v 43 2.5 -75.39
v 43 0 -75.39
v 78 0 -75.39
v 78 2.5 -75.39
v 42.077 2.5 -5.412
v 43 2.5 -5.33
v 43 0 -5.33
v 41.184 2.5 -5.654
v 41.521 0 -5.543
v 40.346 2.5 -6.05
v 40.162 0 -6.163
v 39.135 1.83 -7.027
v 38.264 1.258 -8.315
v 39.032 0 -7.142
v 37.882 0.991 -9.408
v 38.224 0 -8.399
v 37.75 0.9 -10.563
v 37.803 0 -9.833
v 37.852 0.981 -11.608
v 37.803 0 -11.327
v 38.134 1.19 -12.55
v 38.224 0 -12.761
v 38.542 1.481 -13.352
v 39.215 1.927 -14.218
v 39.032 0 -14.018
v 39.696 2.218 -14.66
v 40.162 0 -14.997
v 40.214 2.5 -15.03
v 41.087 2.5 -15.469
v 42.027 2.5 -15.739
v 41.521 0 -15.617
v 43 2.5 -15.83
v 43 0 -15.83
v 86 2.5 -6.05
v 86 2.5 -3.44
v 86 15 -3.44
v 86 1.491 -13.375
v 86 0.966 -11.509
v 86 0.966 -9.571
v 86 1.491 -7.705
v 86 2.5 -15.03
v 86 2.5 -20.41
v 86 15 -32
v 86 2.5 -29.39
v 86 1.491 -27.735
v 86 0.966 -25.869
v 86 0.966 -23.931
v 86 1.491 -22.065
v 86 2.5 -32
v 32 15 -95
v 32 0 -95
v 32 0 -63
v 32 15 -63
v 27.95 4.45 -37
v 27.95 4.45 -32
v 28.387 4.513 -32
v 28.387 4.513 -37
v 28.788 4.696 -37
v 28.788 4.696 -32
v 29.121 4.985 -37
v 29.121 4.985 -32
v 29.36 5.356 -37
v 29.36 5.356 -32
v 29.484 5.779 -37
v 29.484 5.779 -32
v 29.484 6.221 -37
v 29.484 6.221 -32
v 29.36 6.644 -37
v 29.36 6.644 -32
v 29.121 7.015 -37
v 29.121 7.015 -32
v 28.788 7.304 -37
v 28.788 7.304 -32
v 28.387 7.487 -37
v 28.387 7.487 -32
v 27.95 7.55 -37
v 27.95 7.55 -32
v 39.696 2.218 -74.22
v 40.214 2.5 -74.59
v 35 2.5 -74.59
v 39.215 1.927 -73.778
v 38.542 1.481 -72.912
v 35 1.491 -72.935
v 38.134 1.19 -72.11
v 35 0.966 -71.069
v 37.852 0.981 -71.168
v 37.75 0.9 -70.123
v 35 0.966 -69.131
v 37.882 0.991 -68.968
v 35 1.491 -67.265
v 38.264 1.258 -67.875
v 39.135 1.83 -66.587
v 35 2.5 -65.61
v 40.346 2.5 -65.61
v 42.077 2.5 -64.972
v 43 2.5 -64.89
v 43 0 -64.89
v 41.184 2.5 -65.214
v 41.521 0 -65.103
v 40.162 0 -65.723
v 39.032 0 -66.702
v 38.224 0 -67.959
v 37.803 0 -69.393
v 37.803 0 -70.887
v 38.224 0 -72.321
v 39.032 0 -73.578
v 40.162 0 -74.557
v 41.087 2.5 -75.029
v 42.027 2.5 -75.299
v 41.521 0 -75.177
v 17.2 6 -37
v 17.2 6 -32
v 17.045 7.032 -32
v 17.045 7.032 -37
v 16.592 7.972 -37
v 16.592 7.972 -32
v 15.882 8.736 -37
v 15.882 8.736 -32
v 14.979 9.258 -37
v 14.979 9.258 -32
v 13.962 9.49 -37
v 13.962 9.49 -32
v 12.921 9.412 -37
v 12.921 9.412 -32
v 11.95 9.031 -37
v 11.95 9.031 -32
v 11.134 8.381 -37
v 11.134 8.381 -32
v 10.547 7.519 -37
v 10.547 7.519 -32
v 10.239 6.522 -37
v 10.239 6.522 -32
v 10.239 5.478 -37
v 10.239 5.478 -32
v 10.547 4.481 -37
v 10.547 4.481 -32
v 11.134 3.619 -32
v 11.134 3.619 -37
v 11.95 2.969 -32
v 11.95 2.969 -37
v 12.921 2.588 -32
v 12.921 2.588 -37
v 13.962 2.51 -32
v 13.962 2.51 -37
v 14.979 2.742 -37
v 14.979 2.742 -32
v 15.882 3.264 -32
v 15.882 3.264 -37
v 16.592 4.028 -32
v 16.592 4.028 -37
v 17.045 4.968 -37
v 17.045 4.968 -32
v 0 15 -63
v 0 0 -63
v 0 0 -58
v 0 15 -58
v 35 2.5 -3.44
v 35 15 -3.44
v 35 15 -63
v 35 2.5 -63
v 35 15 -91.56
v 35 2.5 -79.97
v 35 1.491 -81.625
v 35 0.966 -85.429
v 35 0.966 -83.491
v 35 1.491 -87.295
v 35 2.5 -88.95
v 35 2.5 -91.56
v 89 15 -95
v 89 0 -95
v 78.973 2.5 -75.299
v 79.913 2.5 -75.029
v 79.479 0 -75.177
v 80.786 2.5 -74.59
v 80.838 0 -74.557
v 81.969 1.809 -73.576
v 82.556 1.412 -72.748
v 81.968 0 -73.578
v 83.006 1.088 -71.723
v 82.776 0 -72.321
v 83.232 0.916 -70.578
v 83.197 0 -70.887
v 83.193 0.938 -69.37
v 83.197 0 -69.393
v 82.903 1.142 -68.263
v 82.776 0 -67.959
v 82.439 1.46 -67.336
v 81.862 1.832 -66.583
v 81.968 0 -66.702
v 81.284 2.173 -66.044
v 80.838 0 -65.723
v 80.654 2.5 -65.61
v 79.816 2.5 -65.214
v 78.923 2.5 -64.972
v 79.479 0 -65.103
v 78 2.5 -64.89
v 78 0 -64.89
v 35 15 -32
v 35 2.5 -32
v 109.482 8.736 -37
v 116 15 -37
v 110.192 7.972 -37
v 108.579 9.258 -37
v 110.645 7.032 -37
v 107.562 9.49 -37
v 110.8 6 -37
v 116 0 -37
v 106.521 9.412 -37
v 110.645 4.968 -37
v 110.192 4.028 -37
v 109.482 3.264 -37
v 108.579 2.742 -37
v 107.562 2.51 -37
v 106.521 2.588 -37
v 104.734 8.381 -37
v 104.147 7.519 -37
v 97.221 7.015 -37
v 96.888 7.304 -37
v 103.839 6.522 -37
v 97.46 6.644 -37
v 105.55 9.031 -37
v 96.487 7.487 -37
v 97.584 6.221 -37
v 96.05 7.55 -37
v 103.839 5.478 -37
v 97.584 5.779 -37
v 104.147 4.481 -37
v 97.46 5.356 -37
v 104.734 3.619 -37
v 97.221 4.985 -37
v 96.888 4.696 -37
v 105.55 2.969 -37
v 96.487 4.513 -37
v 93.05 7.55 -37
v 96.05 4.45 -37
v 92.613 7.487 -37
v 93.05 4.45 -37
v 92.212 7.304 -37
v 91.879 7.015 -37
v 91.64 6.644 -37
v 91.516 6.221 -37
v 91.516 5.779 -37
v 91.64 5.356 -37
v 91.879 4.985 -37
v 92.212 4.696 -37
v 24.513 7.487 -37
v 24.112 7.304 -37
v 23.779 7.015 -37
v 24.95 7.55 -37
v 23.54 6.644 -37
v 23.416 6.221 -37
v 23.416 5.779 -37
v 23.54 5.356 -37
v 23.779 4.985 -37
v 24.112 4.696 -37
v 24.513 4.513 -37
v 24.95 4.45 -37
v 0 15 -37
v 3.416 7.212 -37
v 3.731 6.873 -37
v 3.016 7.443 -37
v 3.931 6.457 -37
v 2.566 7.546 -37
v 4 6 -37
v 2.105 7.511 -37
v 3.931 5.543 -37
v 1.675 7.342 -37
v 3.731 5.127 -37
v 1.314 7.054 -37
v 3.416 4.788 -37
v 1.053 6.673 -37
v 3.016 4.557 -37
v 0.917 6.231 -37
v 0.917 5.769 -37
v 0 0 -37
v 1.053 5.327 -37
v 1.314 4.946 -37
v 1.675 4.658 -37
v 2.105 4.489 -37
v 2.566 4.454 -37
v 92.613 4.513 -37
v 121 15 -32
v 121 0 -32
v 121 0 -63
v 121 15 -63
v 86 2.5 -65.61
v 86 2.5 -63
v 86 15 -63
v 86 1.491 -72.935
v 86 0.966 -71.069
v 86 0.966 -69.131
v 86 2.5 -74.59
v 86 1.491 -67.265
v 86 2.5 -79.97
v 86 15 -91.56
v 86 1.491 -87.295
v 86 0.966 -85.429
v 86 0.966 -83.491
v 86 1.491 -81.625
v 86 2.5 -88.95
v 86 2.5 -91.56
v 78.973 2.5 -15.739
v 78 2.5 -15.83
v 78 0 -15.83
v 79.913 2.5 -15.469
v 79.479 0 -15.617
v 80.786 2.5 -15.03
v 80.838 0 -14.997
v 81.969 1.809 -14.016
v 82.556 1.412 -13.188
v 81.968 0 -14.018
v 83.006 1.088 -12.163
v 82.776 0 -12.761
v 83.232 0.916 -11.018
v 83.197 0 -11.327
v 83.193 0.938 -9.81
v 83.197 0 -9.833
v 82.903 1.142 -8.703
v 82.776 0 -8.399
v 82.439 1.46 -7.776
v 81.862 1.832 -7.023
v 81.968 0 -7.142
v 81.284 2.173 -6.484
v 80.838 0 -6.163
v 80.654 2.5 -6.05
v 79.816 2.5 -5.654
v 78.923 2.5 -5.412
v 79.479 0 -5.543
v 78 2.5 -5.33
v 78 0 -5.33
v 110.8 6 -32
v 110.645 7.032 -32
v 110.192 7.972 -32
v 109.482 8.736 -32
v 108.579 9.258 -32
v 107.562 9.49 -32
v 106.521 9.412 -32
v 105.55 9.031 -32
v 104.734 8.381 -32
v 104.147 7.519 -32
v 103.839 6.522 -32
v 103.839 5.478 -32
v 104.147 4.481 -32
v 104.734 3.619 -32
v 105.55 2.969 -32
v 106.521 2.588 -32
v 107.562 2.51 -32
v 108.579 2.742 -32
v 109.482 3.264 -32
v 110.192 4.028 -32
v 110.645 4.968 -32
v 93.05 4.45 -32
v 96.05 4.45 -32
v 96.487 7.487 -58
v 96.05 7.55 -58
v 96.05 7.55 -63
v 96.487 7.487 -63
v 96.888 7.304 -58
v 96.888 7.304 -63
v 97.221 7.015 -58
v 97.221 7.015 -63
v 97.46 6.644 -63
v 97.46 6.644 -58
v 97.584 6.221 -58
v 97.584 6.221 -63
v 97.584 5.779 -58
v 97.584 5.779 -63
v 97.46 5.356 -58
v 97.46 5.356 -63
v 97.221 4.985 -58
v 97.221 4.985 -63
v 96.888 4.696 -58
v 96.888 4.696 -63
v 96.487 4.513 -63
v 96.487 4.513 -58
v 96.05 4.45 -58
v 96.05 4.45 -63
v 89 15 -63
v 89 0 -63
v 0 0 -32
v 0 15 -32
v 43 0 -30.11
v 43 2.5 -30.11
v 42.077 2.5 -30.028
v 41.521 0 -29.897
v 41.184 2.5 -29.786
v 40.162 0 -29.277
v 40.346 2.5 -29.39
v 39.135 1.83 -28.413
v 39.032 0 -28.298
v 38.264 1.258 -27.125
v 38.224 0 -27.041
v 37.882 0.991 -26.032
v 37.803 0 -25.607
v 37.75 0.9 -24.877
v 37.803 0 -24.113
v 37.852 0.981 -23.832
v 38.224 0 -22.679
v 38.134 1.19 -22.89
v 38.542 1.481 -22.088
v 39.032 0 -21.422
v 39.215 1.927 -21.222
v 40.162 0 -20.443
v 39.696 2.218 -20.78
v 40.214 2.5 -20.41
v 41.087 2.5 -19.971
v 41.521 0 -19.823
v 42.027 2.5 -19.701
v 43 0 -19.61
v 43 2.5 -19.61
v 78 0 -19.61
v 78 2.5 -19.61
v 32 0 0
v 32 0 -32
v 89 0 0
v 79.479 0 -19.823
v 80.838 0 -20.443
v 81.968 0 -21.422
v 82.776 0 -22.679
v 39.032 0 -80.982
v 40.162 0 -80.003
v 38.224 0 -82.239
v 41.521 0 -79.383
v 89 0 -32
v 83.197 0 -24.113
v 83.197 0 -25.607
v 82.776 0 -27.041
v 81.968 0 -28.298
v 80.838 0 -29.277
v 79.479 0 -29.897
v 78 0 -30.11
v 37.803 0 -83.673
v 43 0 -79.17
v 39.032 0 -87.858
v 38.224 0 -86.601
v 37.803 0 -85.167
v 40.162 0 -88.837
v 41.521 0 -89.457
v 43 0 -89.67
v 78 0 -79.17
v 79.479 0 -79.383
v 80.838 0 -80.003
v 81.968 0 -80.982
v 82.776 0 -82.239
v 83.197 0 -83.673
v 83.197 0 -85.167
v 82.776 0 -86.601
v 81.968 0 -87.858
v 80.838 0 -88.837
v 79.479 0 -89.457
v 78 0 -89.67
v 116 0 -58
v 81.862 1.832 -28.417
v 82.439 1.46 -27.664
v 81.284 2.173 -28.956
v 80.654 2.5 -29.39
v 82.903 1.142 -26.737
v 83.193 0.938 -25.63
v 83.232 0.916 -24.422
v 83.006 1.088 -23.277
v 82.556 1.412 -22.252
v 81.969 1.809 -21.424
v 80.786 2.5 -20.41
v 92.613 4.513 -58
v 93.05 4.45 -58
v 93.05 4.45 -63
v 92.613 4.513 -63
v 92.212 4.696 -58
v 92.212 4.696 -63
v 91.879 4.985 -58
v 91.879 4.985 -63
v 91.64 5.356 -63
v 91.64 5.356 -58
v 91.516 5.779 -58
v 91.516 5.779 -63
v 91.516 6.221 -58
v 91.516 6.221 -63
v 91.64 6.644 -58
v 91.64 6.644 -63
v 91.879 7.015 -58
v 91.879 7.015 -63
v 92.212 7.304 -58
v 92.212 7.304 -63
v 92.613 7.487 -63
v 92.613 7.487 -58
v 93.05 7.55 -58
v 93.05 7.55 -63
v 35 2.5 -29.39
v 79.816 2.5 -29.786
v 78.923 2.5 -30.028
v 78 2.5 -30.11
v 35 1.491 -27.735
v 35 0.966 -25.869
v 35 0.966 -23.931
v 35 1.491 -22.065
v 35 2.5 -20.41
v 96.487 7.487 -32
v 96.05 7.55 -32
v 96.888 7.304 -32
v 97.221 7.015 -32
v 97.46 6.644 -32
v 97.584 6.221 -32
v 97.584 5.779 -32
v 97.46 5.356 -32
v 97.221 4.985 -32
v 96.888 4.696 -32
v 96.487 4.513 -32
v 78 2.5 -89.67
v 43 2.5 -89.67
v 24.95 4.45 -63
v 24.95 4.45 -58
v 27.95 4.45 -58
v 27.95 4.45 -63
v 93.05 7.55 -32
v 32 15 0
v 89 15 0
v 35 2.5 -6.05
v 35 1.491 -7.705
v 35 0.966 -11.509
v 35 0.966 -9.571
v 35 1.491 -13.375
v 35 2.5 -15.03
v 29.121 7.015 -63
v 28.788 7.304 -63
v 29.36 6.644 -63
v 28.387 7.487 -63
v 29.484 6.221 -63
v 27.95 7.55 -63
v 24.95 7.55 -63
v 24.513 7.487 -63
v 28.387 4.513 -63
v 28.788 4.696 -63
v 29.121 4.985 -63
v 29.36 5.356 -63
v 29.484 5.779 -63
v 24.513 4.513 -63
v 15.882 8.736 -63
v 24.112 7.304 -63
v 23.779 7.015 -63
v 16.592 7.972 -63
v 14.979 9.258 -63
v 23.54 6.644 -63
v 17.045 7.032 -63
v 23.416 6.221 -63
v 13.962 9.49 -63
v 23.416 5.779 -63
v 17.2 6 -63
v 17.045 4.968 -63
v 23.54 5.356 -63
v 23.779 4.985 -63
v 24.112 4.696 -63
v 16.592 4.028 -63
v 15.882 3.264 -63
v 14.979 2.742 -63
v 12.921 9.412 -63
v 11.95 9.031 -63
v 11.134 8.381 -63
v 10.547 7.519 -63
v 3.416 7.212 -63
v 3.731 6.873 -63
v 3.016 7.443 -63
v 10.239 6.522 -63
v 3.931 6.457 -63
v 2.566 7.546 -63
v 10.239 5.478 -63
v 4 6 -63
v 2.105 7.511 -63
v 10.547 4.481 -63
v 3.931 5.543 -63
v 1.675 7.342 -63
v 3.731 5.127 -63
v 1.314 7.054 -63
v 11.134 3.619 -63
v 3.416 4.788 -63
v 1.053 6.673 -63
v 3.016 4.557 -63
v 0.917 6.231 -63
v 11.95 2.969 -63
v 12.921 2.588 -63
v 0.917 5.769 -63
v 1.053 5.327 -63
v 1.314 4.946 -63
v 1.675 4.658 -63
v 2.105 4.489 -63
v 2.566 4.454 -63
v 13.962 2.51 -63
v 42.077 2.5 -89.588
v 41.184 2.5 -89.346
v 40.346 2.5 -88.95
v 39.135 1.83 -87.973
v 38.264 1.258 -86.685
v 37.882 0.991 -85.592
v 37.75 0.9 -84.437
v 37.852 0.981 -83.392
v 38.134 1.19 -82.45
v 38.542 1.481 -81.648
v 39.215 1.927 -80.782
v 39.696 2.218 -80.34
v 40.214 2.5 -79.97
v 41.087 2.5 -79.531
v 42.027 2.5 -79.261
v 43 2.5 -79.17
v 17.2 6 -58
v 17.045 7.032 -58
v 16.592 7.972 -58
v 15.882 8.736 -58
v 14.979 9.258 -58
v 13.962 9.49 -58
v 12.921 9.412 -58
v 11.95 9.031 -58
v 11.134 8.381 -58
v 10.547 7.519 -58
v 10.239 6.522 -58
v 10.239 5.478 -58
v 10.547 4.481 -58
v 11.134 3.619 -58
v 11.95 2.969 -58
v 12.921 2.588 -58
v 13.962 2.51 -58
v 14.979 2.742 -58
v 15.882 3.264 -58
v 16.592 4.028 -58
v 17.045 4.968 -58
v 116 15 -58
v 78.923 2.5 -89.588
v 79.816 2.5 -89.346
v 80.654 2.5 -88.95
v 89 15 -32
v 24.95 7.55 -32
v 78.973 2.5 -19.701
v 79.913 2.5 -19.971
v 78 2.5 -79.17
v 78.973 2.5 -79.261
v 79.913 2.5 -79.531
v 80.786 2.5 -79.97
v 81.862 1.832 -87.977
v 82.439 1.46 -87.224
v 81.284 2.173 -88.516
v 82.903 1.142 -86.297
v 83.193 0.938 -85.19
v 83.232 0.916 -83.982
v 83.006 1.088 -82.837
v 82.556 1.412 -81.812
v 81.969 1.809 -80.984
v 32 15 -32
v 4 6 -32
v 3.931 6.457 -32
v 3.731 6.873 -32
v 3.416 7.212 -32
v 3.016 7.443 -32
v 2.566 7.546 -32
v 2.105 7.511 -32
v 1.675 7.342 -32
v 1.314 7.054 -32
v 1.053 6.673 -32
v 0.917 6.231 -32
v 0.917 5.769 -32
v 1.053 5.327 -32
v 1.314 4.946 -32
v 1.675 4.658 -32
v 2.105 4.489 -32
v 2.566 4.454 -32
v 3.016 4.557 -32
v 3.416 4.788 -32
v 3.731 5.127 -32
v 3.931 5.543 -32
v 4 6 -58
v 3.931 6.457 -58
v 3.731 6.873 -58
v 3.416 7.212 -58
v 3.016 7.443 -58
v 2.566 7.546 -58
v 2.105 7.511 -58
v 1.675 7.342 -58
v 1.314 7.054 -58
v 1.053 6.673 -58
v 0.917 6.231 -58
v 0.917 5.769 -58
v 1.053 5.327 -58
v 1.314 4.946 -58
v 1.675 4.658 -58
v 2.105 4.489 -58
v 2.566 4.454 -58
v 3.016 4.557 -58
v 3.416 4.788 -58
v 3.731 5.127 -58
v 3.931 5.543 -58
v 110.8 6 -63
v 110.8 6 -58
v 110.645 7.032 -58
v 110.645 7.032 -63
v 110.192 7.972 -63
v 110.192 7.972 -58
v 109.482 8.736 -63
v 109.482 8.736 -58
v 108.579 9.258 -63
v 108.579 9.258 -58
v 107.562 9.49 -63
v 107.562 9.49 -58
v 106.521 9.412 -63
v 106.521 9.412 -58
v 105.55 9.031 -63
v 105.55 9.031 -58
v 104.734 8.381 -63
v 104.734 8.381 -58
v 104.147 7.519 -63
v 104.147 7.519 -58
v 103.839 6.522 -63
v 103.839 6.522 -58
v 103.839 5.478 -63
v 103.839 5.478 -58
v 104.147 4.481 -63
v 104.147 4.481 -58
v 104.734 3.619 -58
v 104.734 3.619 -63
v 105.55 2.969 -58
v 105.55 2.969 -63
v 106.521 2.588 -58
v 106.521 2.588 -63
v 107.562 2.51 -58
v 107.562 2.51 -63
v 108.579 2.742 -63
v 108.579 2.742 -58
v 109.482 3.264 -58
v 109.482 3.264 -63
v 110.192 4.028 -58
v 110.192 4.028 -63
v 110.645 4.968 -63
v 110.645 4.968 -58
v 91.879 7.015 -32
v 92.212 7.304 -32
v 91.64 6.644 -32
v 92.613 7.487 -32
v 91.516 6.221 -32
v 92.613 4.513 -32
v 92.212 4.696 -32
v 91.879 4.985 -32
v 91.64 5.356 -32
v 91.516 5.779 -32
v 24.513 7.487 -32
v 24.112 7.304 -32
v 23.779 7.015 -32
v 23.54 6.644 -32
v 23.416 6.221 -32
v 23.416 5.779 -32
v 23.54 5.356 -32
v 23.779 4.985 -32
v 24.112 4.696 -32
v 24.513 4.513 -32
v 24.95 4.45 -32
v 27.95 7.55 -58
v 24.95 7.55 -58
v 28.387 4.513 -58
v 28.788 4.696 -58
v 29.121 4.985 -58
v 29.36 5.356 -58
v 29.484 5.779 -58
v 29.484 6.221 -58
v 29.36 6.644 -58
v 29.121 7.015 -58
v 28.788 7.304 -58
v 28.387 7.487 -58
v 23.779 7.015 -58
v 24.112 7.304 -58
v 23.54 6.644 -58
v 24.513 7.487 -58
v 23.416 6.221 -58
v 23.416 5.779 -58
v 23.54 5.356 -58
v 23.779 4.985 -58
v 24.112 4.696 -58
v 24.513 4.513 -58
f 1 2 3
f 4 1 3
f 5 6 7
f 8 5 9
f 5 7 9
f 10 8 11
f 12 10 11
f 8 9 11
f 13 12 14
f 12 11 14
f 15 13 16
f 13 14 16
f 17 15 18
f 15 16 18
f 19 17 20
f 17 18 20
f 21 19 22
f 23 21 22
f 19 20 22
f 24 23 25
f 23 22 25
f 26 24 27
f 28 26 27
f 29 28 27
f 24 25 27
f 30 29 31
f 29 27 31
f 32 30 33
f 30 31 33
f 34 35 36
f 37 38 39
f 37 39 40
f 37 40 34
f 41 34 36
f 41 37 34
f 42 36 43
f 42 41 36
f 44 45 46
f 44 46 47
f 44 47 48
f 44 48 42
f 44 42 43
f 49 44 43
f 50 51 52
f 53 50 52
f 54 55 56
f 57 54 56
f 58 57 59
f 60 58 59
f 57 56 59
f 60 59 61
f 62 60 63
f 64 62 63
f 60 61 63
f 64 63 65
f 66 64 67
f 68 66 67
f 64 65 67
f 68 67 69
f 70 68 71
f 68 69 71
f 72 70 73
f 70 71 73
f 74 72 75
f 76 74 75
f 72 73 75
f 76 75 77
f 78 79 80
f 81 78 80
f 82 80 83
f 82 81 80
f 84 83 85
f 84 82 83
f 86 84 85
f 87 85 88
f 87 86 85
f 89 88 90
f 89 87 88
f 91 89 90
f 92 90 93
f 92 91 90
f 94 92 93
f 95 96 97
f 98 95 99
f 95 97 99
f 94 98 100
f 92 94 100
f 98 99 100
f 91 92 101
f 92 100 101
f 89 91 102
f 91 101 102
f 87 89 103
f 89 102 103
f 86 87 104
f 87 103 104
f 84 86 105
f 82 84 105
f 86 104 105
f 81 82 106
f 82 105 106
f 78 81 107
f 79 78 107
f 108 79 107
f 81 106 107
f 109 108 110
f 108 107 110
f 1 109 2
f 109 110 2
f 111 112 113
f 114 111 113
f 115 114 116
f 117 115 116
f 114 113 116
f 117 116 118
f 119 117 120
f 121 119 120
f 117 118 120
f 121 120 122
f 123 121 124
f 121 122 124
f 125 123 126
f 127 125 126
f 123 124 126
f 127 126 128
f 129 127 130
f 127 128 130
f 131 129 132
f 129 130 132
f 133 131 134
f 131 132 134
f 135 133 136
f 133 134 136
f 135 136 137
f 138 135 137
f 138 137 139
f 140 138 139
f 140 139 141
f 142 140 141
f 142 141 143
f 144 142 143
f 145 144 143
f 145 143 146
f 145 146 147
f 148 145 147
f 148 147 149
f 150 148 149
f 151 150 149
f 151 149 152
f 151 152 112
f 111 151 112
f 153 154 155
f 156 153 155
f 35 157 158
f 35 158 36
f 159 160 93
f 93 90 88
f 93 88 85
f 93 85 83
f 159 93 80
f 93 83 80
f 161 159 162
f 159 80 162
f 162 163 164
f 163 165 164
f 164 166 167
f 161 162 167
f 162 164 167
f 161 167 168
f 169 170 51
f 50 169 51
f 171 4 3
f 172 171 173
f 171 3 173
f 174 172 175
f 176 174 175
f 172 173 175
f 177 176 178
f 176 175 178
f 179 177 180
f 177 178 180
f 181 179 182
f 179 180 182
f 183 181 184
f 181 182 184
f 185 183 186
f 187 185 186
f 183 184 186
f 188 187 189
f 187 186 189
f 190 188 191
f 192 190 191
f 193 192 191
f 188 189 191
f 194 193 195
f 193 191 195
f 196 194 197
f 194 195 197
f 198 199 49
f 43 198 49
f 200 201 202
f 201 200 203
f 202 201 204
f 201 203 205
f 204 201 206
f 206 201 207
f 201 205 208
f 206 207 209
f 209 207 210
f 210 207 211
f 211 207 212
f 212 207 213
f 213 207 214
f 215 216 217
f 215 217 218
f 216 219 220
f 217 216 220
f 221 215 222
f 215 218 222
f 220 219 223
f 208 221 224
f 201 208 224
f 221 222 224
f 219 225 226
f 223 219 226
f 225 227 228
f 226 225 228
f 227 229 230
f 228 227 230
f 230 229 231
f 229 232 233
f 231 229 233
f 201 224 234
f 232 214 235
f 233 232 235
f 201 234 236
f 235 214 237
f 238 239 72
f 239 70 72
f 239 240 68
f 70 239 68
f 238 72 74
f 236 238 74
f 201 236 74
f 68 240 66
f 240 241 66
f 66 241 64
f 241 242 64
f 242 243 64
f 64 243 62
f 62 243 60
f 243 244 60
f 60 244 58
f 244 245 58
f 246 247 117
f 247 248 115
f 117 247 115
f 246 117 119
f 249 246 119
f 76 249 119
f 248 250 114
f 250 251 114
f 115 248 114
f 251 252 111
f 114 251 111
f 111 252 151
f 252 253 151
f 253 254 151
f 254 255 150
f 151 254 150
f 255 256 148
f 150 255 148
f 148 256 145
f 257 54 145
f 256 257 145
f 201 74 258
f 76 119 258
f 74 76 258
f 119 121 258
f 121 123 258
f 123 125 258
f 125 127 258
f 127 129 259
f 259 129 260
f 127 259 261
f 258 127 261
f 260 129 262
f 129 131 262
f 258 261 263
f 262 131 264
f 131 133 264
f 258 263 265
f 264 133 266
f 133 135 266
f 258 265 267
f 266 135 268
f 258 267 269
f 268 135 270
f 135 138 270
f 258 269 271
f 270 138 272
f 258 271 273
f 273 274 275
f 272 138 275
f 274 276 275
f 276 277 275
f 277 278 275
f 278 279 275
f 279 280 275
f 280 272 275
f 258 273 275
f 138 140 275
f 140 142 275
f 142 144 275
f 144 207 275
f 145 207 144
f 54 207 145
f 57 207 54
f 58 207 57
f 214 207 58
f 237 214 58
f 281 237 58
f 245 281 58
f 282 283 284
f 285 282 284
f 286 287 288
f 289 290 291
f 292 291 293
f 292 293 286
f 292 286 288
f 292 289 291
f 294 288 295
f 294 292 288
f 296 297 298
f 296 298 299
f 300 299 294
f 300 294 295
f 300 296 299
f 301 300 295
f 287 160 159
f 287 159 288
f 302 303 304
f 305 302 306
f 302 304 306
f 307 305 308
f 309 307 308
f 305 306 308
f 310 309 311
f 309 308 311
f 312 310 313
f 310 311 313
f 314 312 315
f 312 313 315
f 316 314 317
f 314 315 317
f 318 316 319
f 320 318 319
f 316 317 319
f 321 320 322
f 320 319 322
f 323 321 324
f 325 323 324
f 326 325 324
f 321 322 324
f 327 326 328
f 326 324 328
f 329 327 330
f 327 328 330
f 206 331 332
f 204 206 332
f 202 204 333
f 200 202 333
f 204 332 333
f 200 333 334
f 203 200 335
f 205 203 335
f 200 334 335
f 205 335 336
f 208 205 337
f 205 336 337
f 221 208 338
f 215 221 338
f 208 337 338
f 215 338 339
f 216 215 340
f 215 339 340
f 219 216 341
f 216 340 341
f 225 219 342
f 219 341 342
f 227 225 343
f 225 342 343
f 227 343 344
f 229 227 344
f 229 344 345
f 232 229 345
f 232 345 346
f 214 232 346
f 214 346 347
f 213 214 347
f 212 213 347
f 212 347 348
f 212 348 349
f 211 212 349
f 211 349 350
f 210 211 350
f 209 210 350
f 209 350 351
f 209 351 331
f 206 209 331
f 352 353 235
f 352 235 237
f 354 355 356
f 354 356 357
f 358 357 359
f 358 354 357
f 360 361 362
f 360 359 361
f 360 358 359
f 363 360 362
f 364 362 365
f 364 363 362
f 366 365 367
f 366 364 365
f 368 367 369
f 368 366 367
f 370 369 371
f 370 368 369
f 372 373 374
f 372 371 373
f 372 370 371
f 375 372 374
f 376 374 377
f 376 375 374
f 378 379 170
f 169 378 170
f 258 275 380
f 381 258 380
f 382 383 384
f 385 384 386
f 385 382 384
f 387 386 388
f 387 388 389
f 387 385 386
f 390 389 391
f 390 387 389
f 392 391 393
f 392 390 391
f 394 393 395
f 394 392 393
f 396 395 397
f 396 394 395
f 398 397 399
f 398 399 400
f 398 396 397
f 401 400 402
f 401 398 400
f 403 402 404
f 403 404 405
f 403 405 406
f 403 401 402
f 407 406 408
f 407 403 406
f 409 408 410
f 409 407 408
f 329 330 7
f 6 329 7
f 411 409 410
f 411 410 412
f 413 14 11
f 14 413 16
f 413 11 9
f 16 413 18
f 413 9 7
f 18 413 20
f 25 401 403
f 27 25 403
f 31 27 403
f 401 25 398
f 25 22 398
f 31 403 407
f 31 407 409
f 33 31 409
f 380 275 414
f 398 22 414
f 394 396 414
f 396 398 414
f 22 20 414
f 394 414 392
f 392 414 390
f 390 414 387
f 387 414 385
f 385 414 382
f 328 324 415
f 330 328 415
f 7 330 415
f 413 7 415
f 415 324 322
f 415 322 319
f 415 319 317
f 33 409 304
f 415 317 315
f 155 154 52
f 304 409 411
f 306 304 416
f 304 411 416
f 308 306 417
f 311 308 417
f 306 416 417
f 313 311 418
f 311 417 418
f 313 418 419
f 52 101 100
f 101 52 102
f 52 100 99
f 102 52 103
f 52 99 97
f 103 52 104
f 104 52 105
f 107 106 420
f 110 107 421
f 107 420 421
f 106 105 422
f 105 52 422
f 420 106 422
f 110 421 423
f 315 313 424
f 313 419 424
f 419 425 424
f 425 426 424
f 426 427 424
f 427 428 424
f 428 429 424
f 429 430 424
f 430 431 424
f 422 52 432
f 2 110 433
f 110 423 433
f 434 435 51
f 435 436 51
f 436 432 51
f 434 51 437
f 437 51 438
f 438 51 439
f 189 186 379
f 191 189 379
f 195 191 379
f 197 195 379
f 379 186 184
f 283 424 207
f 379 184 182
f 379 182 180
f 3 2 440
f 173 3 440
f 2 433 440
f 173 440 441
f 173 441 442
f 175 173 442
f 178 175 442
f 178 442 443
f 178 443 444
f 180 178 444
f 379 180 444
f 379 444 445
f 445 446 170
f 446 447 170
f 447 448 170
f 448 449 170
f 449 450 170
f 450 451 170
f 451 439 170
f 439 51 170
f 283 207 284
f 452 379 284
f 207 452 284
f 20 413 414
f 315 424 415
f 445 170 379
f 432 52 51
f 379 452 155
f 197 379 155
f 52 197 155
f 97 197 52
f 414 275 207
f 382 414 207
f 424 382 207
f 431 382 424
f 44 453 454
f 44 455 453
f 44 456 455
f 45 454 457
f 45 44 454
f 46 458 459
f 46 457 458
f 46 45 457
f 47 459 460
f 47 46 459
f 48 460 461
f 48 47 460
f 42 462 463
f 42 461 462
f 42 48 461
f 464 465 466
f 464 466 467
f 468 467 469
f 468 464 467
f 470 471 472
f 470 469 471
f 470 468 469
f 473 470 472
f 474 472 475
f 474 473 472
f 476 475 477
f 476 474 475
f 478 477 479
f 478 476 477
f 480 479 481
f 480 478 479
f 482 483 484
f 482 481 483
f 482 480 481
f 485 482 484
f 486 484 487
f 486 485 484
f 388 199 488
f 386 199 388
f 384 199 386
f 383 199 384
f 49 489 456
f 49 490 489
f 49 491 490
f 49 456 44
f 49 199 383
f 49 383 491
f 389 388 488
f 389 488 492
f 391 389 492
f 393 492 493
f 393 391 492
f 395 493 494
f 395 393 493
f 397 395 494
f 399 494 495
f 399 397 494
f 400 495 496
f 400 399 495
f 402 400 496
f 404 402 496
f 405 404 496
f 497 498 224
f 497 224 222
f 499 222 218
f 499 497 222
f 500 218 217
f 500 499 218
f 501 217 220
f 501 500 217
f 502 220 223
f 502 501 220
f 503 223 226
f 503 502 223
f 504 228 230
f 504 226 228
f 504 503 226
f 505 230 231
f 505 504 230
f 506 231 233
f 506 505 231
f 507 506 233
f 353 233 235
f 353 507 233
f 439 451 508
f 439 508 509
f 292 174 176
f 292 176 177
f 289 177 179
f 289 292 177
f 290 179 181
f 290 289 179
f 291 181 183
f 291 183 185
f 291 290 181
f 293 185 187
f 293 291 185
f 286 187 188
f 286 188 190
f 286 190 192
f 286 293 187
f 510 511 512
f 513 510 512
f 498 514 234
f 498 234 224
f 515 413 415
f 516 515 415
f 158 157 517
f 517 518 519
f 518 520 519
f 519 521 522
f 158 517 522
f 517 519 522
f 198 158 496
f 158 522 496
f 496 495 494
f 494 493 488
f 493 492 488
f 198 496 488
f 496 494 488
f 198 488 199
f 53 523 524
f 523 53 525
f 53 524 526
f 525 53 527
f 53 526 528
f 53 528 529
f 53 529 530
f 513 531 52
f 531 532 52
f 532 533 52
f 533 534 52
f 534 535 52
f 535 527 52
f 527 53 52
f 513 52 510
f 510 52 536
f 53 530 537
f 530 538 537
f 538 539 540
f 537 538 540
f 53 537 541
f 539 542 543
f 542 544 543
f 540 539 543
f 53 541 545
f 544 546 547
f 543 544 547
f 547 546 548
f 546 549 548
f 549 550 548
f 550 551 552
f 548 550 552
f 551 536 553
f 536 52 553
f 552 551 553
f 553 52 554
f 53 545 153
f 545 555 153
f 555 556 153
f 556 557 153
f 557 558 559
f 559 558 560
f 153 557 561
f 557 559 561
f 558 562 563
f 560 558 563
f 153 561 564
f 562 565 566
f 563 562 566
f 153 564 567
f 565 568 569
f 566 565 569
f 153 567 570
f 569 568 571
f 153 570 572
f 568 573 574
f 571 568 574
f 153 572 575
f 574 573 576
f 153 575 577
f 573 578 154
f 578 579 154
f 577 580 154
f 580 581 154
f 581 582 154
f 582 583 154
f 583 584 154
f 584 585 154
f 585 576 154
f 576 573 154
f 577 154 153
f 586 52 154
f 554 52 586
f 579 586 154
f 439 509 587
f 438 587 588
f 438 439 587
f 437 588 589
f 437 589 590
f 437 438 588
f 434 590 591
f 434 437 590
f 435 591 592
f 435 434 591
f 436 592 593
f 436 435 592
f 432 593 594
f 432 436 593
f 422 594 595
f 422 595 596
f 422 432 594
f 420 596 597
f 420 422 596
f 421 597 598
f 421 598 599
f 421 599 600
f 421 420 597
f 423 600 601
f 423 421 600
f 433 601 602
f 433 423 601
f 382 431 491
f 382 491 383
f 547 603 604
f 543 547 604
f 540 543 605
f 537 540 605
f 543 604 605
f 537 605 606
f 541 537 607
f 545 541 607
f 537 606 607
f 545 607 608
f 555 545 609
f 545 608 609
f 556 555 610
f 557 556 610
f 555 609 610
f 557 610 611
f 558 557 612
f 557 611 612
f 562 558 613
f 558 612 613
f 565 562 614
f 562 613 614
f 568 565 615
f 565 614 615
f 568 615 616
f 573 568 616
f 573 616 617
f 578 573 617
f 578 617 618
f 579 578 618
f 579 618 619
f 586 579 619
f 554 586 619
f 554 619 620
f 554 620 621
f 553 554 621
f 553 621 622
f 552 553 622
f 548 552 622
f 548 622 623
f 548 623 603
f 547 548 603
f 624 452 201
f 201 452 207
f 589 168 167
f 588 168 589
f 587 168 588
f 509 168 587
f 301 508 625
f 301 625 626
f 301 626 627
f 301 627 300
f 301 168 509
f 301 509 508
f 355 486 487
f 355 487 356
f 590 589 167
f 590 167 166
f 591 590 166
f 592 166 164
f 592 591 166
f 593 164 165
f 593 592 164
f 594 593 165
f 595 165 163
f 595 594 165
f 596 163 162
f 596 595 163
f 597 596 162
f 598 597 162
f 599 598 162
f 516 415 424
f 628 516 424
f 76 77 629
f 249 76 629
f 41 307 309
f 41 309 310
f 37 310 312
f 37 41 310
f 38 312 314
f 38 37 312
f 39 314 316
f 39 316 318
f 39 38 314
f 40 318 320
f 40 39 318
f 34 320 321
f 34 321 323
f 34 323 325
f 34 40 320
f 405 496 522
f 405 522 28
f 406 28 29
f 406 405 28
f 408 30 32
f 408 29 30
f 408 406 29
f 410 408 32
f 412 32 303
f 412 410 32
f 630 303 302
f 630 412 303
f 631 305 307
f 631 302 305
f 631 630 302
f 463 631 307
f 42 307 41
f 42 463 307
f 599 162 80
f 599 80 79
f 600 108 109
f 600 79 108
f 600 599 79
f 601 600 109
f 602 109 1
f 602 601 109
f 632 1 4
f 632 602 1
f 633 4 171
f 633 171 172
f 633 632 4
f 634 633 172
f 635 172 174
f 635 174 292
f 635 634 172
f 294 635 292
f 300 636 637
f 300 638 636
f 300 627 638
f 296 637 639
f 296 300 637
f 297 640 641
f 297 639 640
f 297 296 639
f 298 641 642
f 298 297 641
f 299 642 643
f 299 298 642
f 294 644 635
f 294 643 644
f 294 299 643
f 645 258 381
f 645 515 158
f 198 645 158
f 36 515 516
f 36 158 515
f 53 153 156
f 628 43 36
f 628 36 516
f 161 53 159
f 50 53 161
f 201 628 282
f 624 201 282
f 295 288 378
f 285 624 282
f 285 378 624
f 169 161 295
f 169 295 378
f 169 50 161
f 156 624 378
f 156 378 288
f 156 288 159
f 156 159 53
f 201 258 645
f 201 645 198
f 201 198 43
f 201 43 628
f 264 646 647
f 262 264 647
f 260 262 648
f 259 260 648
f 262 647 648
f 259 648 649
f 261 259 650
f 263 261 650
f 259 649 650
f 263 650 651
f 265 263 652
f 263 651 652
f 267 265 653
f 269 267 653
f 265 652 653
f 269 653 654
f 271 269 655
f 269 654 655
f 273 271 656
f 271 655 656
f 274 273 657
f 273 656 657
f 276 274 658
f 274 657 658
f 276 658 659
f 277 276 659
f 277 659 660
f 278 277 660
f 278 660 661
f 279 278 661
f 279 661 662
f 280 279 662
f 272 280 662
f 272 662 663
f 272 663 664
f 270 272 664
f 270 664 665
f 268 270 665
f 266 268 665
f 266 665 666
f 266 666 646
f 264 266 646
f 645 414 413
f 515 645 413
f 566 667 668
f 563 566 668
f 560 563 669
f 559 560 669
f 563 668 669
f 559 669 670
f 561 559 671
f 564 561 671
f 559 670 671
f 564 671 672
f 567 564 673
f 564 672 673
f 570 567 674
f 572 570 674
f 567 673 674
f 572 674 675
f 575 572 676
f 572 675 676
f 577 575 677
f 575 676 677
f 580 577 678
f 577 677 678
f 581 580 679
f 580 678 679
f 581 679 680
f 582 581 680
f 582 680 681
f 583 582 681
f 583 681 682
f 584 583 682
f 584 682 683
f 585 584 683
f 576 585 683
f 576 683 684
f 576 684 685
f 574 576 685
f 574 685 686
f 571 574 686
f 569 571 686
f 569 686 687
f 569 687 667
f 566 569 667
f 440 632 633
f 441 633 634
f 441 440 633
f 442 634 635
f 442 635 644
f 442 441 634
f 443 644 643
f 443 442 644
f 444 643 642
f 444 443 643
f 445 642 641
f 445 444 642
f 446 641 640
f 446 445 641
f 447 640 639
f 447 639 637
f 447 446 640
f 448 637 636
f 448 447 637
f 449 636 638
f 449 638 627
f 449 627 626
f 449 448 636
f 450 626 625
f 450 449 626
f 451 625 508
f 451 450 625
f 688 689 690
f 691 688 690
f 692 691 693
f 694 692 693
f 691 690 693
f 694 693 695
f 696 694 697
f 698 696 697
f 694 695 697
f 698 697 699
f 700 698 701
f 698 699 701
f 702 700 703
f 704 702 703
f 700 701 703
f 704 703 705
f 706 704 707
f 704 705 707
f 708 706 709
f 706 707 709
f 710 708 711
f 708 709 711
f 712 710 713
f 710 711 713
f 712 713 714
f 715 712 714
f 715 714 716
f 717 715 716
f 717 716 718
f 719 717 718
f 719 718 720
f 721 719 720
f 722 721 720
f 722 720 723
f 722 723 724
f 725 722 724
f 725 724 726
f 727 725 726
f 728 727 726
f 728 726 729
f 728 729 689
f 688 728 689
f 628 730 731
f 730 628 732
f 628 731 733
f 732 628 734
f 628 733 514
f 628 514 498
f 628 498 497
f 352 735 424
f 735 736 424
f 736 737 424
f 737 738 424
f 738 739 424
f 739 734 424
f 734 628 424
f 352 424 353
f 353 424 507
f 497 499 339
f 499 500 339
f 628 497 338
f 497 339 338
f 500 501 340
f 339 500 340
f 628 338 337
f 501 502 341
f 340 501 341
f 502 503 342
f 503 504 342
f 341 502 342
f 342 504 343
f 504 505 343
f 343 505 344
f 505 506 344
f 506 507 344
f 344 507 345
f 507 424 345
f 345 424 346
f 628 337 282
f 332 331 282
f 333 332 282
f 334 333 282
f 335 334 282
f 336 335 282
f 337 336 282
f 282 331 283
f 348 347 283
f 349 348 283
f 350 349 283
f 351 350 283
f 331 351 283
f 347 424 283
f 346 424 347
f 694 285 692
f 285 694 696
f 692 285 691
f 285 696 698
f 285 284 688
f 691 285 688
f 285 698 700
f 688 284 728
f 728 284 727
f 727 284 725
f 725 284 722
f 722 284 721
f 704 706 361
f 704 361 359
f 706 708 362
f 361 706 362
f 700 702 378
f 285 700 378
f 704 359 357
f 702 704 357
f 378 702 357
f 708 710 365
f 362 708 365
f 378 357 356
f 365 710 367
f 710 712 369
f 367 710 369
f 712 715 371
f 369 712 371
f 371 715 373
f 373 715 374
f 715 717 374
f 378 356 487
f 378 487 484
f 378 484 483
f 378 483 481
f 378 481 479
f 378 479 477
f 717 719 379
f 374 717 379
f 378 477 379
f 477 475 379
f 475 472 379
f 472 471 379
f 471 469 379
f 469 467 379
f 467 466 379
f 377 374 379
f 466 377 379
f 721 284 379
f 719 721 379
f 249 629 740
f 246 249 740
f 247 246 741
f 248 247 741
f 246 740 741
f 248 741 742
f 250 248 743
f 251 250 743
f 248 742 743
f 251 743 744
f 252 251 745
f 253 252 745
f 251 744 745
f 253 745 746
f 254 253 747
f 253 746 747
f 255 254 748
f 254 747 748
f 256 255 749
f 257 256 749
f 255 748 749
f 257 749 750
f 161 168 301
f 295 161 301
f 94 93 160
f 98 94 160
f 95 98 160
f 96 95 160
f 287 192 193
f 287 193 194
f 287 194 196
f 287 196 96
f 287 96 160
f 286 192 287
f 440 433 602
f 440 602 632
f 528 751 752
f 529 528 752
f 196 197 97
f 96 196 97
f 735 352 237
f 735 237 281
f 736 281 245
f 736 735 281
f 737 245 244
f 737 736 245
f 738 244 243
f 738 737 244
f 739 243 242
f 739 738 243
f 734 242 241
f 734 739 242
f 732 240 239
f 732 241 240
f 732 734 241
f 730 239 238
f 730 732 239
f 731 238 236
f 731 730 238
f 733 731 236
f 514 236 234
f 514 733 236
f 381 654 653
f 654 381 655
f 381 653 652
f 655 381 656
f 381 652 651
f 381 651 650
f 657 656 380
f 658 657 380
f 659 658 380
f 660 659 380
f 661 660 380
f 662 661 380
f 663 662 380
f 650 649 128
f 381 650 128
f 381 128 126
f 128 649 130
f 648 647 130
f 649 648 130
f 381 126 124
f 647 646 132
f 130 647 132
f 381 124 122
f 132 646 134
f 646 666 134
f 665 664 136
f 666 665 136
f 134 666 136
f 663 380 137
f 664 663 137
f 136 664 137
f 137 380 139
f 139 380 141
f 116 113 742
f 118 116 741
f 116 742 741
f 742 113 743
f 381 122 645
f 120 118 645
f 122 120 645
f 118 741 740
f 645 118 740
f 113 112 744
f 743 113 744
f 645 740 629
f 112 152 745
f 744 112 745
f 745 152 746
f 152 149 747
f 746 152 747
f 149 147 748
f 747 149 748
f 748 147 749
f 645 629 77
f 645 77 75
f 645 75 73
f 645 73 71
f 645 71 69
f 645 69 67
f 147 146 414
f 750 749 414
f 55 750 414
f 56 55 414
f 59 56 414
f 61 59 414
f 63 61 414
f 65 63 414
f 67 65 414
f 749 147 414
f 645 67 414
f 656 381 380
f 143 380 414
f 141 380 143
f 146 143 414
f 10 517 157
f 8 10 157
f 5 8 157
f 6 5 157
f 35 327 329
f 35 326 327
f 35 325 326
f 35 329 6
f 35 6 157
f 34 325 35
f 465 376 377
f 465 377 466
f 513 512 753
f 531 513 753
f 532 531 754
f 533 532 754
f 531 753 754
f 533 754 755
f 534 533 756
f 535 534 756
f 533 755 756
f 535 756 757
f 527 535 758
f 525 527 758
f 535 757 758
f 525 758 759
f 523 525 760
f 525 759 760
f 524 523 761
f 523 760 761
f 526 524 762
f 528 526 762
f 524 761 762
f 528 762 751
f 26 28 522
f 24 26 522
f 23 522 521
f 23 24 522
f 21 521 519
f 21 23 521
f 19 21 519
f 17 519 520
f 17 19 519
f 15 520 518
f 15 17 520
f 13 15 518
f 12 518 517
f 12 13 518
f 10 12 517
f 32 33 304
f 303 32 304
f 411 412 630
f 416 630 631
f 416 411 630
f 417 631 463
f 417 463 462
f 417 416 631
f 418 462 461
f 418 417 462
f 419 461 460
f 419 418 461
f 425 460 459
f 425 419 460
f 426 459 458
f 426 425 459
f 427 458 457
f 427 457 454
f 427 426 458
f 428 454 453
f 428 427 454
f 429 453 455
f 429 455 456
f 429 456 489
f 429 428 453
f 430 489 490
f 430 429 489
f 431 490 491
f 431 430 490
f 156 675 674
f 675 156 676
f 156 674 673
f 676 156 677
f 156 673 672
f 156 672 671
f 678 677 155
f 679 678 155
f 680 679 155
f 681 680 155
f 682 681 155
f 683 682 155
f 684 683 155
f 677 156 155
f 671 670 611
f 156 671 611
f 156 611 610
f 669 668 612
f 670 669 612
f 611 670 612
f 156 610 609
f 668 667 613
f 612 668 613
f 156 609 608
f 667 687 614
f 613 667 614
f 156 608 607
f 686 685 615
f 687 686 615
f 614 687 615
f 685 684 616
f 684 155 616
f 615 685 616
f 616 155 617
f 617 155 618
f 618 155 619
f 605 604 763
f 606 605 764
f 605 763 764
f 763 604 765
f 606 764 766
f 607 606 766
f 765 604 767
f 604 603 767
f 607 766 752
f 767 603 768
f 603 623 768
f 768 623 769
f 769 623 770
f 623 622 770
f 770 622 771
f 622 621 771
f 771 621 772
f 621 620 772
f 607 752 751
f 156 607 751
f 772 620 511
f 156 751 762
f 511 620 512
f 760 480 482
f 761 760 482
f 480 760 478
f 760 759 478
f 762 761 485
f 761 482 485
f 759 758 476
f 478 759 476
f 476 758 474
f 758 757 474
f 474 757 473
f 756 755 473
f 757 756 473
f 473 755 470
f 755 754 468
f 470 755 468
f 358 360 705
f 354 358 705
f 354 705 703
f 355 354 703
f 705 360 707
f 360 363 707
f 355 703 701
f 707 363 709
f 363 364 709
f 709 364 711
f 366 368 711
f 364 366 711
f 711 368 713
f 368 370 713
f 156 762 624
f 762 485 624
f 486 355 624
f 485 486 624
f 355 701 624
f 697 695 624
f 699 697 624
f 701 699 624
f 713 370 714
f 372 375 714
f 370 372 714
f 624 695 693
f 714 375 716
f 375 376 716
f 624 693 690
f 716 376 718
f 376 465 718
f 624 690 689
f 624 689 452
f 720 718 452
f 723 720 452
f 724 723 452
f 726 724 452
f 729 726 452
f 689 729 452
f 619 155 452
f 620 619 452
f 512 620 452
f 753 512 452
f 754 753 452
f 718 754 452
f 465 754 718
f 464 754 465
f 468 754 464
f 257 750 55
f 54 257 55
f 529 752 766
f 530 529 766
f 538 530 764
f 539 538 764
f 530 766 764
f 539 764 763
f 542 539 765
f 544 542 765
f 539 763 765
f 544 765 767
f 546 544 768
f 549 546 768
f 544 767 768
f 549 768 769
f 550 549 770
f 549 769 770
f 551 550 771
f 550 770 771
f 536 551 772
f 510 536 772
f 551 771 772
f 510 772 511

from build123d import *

# Parameters (mm, degrees)
SKETCH1_W                  = 51
SKETCH1_H                  = 28.56
TOTALHEIGHT_DEPTH          = 15
SKETCH1_3_W                = 51
SKETCH1_3_H                = 28.56
FLOORHEIGHT_DEPTH          = 2.5
HOLESFORBEARINGMOUNT_REACH = 139.241
SKETCH2_R                  = 1.55
SKETCH2_R_2                = 3.5
CUT_EXTRUDE2_REACH         = 131.019


with BuildPart() as part:
    # Sketch1 → TotalHeight (new body)
    with BuildSketch(Plane(origin=(0, 0, 0), x_dir=(1, 0, 0), z_dir=(0, 1, 0))):
        Polygon((32, 32), (32, 0), (89, 0), (89, 32), (121, 32), (121, 47.5), (121, 63), (89, 63), (89, 95), (32, 95), (32, 63), (0, 63), (0, 58), (5, 58), (116, 58), (116, 37), (5, 37), (0, 37), (0, 32), align=None)
        with Locations((60.5, 17.72)):
            Rectangle(SKETCH1_W, SKETCH1_H, mode=Mode.SUBTRACT)
        with Locations((60.5, 77.28)):
            Rectangle(SKETCH1_W, SKETCH1_H, mode=Mode.SUBTRACT)
    extrude(amount=TOTALHEIGHT_DEPTH)

    # Sketch1<3> → FloorHeight (add)
    # profile 1 of 2: a face of its own
    with BuildSketch(Plane(origin=(0, 0, 0), x_dir=(1, 0, 0), z_dir=(0, 1, 0))):
        with Locations((60.5, 77.28)):
            Rectangle(SKETCH1_3_W, SKETCH1_3_H)
        with BuildLine():
            ThreePointArc((78, 79.17), (83.25, 84.42), (78, 89.67))
            Line((78, 89.67), (43, 89.67))
            ThreePointArc((43, 89.67), (37.75, 84.42), (43, 79.17))
            Line((43, 79.17), (78, 79.17))
        make_face(mode=Mode.SUBTRACT)
        with BuildLine():
            Line((43, 75.39), (78, 75.39))
            ThreePointArc((78, 75.39), (83.25, 70.14), (78, 64.89))
            Line((78, 64.89), (43, 64.89))
            ThreePointArc((43, 64.89), (37.75, 70.14), (43, 75.39))
        make_face(mode=Mode.SUBTRACT)
    # profile 2 of 2: a face of its own
    with BuildSketch(Plane(origin=(0, 0, 0), x_dir=(1, 0, 0), z_dir=(0, 1, 0))):
        with Locations((60.5, 17.72)):
            Rectangle(SKETCH1_3_W, SKETCH1_3_H)
        with BuildLine():
            ThreePointArc((78, 19.61), (83.25, 24.86), (78, 30.11))
            Line((78, 30.11), (43, 30.11))
            ThreePointArc((43, 30.11), (37.75, 24.86), (43, 19.61))
            Line((43, 19.61), (78, 19.61))
        make_face(mode=Mode.SUBTRACT)
        with BuildLine():
            Line((43, 15.83), (78, 15.83))
            ThreePointArc((78, 15.83), (83.25, 10.58), (78, 5.33))
            Line((78, 5.33), (43, 5.33))
            ThreePointArc((43, 5.33), (37.75, 10.58), (43, 15.83))
        make_face(mode=Mode.SUBTRACT)
    extrude(amount=FLOORHEIGHT_DEPTH)

    # HolesForBearingMount: up to this face of the body (flat: up to its plane)
    holesforbearingmount_end = Plane(part.part.faces().sort_by_distance((16, 7.5, -63))[0])
    # Sketch2 → HolesForBearingMount (cut, up to the picked face)
    with BuildSketch(Plane.XY.offset(-32), mode=Mode.PRIVATE) as holesforbearingmount_sk1:
        with Locations((2.45, 6)):
            Circle(SKETCH2_R)
    holesforbearingmount_tool1 = split(extrude(holesforbearingmount_sk1.sketch, amount=-HOLESFORBEARINGMOUNT_REACH, mode=Mode.PRIVATE), bisect_by=holesforbearingmount_end, keep=Keep.BOTH, mode=Mode.PRIVATE)
    # Sketch2 → HolesForBearingMount (cut, up to the picked face)
    with BuildSketch(Plane.XY.offset(-32), mode=Mode.PRIVATE) as holesforbearingmount_sk2:
        with Locations((13.7, 6)):
            Circle(SKETCH2_R_2)
    holesforbearingmount_tool2 = split(extrude(holesforbearingmount_sk2.sketch, amount=-HOLESFORBEARINGMOUNT_REACH, mode=Mode.PRIVATE), bisect_by=holesforbearingmount_end, keep=Keep.BOTH, mode=Mode.PRIVATE)
    # Sketch2 → HolesForBearingMount (cut, up to the picked face)
    with BuildSketch(Plane.XY.offset(-32), mode=Mode.PRIVATE) as holesforbearingmount_sk3:
        with BuildLine():
            Line((24.95, 4.45), (27.95, 4.45))
            ThreePointArc((27.95, 4.45), (29.5, 6), (27.95, 7.55))
            Line((27.95, 7.55), (24.95, 7.55))
            ThreePointArc((24.95, 7.55), (23.4, 6), (24.95, 4.45))
        make_face()
    holesforbearingmount_tool3 = split(extrude(holesforbearingmount_sk3.sketch, amount=-HOLESFORBEARINGMOUNT_REACH, mode=Mode.PRIVATE), bisect_by=holesforbearingmount_end, keep=Keep.BOTH, mode=Mode.PRIVATE)
    # Sketch2 → HolesForBearingMount (cut, up to the picked face)
    with BuildSketch(Plane.XY.offset(-32), mode=Mode.PRIVATE) as holesforbearingmount_sk4:
        with BuildLine():
            ThreePointArc((93.05, 4.45), (91.5, 6), (93.05, 7.55))
            Line((93.05, 7.55), (96.05, 7.55))
            ThreePointArc((96.05, 7.55), (97.6, 6), (96.05, 4.45))
            Line((96.05, 4.45), (93.05, 4.45))
        make_face()
    holesforbearingmount_tool4 = split(extrude(holesforbearingmount_sk4.sketch, amount=-HOLESFORBEARINGMOUNT_REACH, mode=Mode.PRIVATE), bisect_by=holesforbearingmount_end, keep=Keep.BOTH, mode=Mode.PRIVATE)
    # Sketch2 → HolesForBearingMount (cut, up to the picked face)
    with BuildSketch(Plane.XY.offset(-32), mode=Mode.PRIVATE) as holesforbearingmount_sk5:
        with Locations((107.3, 6)):
            Circle(SKETCH2_R_2)
    holesforbearingmount_tool5 = split(extrude(holesforbearingmount_sk5.sketch, amount=-HOLESFORBEARINGMOUNT_REACH, mode=Mode.PRIVATE), bisect_by=holesforbearingmount_end, keep=Keep.BOTH, mode=Mode.PRIVATE)
    add(holesforbearingmount_tool1.solids().sort_by(Axis((2.45, 6, -32), (0, 0, -1)))[0], mode=Mode.SUBTRACT)
    add(holesforbearingmount_tool2.solids().sort_by(Axis((13.7, 6, -32), (0, 0, -1)))[0], mode=Mode.SUBTRACT)
    add(holesforbearingmount_tool3.solids().sort_by(Axis((26.45, 6, -32), (0, 0, -1)))[0], mode=Mode.SUBTRACT)
    add(holesforbearingmount_tool4.solids().sort_by(Axis((94.55, 6, -32), (0, 0, -1)))[0], mode=Mode.SUBTRACT)
    add(holesforbearingmount_tool5.solids().sort_by(Axis((107.3, 6, -32), (0, 0, -1)))[0], mode=Mode.SUBTRACT)

    # Cut-Extrude2: up to this face of the body (flat: up to its plane)
    cut_extrude2_end = Plane(part.part.faces().sort_by_distance((35, 8.75, -17.72))[0])
    # Sketch3 → Cut-Extrude2 (cut, up to the picked face)
    with BuildSketch(Plane.ZY.offset(-86), mode=Mode.PRIVATE) as cut_extrude2_sk1:
        with BuildLine():
            ThreePointArc((-77.36, 8), (-87.503934876, 14.414394786), (-88.949988864, 2.5))
            Line((-88.949988864, 2.5), (-79.970011136, 2.5))
            ThreePointArc((-79.970011136, 2.5), (-78.045605214, 4.956065124), (-77.36, 8))
        make_face()
    cut_extrude2_tool1 = split(extrude(cut_extrude2_sk1.sketch, amount=CUT_EXTRUDE2_REACH, mode=Mode.PRIVATE), bisect_by=cut_extrude2_end, keep=Keep.BOTH, mode=Mode.PRIVATE)
    # Sketch3 → Cut-Extrude2 (cut, up to the picked face)
    with BuildSketch(Plane.ZY.offset(-86), mode=Mode.PRIVATE) as cut_extrude2_sk2:
        with BuildLine():
            Line((-79.970011136, 2.5), (-88.949988864, 2.5))
            ThreePointArc((-88.949988864, 2.5), (-84.46, 0.9), (-79.970011136, 2.5))
        make_face()
    cut_extrude2_tool2 = split(extrude(cut_extrude2_sk2.sketch, amount=CUT_EXTRUDE2_REACH, mode=Mode.PRIVATE), bisect_by=cut_extrude2_end, keep=Keep.BOTH, mode=Mode.PRIVATE)
    # Sketch3 → Cut-Extrude2 (cut, up to the picked face)
    with BuildSketch(Plane.ZY.offset(-86), mode=Mode.PRIVATE) as cut_extrude2_sk3:
        with BuildLine():
            ThreePointArc((-63, 8), (-73.143934876, 14.414394786), (-74.589988864, 2.5))
            Line((-74.589988864, 2.5), (-65.610011136, 2.5))
            ThreePointArc((-65.610011136, 2.5), (-63.685605214, 4.956065124), (-63, 8))
        make_face()
    cut_extrude2_tool3 = split(extrude(cut_extrude2_sk3.sketch, amount=CUT_EXTRUDE2_REACH, mode=Mode.PRIVATE), bisect_by=cut_extrude2_end, keep=Keep.BOTH, mode=Mode.PRIVATE)
    # Sketch3 → Cut-Extrude2 (cut, up to the picked face)
    with BuildSketch(Plane.ZY.offset(-86), mode=Mode.PRIVATE) as cut_extrude2_sk4:
        with BuildLine():
            Line((-65.610011136, 2.5), (-74.589988864, 2.5))
            ThreePointArc((-74.589988864, 2.5), (-70.1, 0.9), (-65.610011136, 2.5))
        make_face()
    cut_extrude2_tool4 = split(extrude(cut_extrude2_sk4.sketch, amount=CUT_EXTRUDE2_REACH, mode=Mode.PRIVATE), bisect_by=cut_extrude2_end, keep=Keep.BOTH, mode=Mode.PRIVATE)
    # Sketch3 → Cut-Extrude2 (cut, up to the picked face)
    with BuildSketch(Plane.ZY.offset(-86), mode=Mode.PRIVATE) as cut_extrude2_sk5:
        with BuildLine():
            ThreePointArc((-17.8, 8), (-27.943934876, 14.414394786), (-29.389988864, 2.5))
            Line((-29.389988864, 2.5), (-20.410011136, 2.5))
            ThreePointArc((-20.410011136, 2.5), (-18.485605214, 4.956065124), (-17.8, 8))
        make_face()
    cut_extrude2_tool5 = split(extrude(cut_extrude2_sk5.sketch, amount=CUT_EXTRUDE2_REACH, mode=Mode.PRIVATE), bisect_by=cut_extrude2_end, keep=Keep.BOTH, mode=Mode.PRIVATE)
    # Sketch3 → Cut-Extrude2 (cut, up to the picked face)
    with BuildSketch(Plane.ZY.offset(-86), mode=Mode.PRIVATE) as cut_extrude2_sk6:
        with BuildLine():
            Line((-20.410011136, 2.5), (-29.389988864, 2.5))
            ThreePointArc((-29.389988864, 2.5), (-24.9, 0.9), (-20.410011136, 2.5))
        make_face()
    cut_extrude2_tool6 = split(extrude(cut_extrude2_sk6.sketch, amount=CUT_EXTRUDE2_REACH, mode=Mode.PRIVATE), bisect_by=cut_extrude2_end, keep=Keep.BOTH, mode=Mode.PRIVATE)
    # Sketch3 → Cut-Extrude2 (cut, up to the picked face)
    with BuildSketch(Plane.ZY.offset(-86), mode=Mode.PRIVATE) as cut_extrude2_sk7:
        with BuildLine():
            ThreePointArc((-3.44, 8), (-13.583934876, 14.414394786), (-15.029988864, 2.5))
            Line((-15.029988864, 2.5), (-6.050011136, 2.5))
            ThreePointArc((-6.050011136, 2.5), (-4.125605214, 4.956065124), (-3.44, 8))
        make_face()
    cut_extrude2_tool7 = split(extrude(cut_extrude2_sk7.sketch, amount=CUT_EXTRUDE2_REACH, mode=Mode.PRIVATE), bisect_by=cut_extrude2_end, keep=Keep.BOTH, mode=Mode.PRIVATE)
    # Sketch3 → Cut-Extrude2 (cut, up to the picked face)
    with BuildSketch(Plane.ZY.offset(-86), mode=Mode.PRIVATE) as cut_extrude2_sk8:
        with BuildLine():
            Line((-6.050011136, 2.5), (-15.029988864, 2.5))
            ThreePointArc((-15.029988864, 2.5), (-10.54, 0.9), (-6.050011136, 2.5))
        make_face()
    cut_extrude2_tool8 = split(extrude(cut_extrude2_sk8.sketch, amount=CUT_EXTRUDE2_REACH, mode=Mode.PRIVATE), bisect_by=cut_extrude2_end, keep=Keep.BOTH, mode=Mode.PRIVATE)
    add(cut_extrude2_tool1.solids().sort_by(Axis((86, 8.40623, -84.46), (-1, 0, 0)))[0], mode=Mode.SUBTRACT)
    add(cut_extrude2_tool2.solids().sort_by(Axis((86, 1.853386, -84.46), (-1, 0, 0)))[0], mode=Mode.SUBTRACT)
    add(cut_extrude2_tool3.solids().sort_by(Axis((86, 8.40623, -70.1), (-1, 0, 0)))[0], mode=Mode.SUBTRACT)
    add(cut_extrude2_tool4.solids().sort_by(Axis((86, 1.853386, -70.1), (-1, 0, 0)))[0], mode=Mode.SUBTRACT)
    add(cut_extrude2_tool5.solids().sort_by(Axis((86, 8.40623, -24.9), (-1, 0, 0)))[0], mode=Mode.SUBTRACT)
    add(cut_extrude2_tool6.solids().sort_by(Axis((86, 1.853386, -24.9), (-1, 0, 0)))[0], mode=Mode.SUBTRACT)
    add(cut_extrude2_tool7.solids().sort_by(Axis((86, 8.40623, -10.54), (-1, 0, 0)))[0], mode=Mode.SUBTRACT)
    add(cut_extrude2_tool8.solids().sort_by(Axis((86, 1.853386, -10.54), (-1, 0, 0)))[0], mode=Mode.SUBTRACT)


solid = part.part
